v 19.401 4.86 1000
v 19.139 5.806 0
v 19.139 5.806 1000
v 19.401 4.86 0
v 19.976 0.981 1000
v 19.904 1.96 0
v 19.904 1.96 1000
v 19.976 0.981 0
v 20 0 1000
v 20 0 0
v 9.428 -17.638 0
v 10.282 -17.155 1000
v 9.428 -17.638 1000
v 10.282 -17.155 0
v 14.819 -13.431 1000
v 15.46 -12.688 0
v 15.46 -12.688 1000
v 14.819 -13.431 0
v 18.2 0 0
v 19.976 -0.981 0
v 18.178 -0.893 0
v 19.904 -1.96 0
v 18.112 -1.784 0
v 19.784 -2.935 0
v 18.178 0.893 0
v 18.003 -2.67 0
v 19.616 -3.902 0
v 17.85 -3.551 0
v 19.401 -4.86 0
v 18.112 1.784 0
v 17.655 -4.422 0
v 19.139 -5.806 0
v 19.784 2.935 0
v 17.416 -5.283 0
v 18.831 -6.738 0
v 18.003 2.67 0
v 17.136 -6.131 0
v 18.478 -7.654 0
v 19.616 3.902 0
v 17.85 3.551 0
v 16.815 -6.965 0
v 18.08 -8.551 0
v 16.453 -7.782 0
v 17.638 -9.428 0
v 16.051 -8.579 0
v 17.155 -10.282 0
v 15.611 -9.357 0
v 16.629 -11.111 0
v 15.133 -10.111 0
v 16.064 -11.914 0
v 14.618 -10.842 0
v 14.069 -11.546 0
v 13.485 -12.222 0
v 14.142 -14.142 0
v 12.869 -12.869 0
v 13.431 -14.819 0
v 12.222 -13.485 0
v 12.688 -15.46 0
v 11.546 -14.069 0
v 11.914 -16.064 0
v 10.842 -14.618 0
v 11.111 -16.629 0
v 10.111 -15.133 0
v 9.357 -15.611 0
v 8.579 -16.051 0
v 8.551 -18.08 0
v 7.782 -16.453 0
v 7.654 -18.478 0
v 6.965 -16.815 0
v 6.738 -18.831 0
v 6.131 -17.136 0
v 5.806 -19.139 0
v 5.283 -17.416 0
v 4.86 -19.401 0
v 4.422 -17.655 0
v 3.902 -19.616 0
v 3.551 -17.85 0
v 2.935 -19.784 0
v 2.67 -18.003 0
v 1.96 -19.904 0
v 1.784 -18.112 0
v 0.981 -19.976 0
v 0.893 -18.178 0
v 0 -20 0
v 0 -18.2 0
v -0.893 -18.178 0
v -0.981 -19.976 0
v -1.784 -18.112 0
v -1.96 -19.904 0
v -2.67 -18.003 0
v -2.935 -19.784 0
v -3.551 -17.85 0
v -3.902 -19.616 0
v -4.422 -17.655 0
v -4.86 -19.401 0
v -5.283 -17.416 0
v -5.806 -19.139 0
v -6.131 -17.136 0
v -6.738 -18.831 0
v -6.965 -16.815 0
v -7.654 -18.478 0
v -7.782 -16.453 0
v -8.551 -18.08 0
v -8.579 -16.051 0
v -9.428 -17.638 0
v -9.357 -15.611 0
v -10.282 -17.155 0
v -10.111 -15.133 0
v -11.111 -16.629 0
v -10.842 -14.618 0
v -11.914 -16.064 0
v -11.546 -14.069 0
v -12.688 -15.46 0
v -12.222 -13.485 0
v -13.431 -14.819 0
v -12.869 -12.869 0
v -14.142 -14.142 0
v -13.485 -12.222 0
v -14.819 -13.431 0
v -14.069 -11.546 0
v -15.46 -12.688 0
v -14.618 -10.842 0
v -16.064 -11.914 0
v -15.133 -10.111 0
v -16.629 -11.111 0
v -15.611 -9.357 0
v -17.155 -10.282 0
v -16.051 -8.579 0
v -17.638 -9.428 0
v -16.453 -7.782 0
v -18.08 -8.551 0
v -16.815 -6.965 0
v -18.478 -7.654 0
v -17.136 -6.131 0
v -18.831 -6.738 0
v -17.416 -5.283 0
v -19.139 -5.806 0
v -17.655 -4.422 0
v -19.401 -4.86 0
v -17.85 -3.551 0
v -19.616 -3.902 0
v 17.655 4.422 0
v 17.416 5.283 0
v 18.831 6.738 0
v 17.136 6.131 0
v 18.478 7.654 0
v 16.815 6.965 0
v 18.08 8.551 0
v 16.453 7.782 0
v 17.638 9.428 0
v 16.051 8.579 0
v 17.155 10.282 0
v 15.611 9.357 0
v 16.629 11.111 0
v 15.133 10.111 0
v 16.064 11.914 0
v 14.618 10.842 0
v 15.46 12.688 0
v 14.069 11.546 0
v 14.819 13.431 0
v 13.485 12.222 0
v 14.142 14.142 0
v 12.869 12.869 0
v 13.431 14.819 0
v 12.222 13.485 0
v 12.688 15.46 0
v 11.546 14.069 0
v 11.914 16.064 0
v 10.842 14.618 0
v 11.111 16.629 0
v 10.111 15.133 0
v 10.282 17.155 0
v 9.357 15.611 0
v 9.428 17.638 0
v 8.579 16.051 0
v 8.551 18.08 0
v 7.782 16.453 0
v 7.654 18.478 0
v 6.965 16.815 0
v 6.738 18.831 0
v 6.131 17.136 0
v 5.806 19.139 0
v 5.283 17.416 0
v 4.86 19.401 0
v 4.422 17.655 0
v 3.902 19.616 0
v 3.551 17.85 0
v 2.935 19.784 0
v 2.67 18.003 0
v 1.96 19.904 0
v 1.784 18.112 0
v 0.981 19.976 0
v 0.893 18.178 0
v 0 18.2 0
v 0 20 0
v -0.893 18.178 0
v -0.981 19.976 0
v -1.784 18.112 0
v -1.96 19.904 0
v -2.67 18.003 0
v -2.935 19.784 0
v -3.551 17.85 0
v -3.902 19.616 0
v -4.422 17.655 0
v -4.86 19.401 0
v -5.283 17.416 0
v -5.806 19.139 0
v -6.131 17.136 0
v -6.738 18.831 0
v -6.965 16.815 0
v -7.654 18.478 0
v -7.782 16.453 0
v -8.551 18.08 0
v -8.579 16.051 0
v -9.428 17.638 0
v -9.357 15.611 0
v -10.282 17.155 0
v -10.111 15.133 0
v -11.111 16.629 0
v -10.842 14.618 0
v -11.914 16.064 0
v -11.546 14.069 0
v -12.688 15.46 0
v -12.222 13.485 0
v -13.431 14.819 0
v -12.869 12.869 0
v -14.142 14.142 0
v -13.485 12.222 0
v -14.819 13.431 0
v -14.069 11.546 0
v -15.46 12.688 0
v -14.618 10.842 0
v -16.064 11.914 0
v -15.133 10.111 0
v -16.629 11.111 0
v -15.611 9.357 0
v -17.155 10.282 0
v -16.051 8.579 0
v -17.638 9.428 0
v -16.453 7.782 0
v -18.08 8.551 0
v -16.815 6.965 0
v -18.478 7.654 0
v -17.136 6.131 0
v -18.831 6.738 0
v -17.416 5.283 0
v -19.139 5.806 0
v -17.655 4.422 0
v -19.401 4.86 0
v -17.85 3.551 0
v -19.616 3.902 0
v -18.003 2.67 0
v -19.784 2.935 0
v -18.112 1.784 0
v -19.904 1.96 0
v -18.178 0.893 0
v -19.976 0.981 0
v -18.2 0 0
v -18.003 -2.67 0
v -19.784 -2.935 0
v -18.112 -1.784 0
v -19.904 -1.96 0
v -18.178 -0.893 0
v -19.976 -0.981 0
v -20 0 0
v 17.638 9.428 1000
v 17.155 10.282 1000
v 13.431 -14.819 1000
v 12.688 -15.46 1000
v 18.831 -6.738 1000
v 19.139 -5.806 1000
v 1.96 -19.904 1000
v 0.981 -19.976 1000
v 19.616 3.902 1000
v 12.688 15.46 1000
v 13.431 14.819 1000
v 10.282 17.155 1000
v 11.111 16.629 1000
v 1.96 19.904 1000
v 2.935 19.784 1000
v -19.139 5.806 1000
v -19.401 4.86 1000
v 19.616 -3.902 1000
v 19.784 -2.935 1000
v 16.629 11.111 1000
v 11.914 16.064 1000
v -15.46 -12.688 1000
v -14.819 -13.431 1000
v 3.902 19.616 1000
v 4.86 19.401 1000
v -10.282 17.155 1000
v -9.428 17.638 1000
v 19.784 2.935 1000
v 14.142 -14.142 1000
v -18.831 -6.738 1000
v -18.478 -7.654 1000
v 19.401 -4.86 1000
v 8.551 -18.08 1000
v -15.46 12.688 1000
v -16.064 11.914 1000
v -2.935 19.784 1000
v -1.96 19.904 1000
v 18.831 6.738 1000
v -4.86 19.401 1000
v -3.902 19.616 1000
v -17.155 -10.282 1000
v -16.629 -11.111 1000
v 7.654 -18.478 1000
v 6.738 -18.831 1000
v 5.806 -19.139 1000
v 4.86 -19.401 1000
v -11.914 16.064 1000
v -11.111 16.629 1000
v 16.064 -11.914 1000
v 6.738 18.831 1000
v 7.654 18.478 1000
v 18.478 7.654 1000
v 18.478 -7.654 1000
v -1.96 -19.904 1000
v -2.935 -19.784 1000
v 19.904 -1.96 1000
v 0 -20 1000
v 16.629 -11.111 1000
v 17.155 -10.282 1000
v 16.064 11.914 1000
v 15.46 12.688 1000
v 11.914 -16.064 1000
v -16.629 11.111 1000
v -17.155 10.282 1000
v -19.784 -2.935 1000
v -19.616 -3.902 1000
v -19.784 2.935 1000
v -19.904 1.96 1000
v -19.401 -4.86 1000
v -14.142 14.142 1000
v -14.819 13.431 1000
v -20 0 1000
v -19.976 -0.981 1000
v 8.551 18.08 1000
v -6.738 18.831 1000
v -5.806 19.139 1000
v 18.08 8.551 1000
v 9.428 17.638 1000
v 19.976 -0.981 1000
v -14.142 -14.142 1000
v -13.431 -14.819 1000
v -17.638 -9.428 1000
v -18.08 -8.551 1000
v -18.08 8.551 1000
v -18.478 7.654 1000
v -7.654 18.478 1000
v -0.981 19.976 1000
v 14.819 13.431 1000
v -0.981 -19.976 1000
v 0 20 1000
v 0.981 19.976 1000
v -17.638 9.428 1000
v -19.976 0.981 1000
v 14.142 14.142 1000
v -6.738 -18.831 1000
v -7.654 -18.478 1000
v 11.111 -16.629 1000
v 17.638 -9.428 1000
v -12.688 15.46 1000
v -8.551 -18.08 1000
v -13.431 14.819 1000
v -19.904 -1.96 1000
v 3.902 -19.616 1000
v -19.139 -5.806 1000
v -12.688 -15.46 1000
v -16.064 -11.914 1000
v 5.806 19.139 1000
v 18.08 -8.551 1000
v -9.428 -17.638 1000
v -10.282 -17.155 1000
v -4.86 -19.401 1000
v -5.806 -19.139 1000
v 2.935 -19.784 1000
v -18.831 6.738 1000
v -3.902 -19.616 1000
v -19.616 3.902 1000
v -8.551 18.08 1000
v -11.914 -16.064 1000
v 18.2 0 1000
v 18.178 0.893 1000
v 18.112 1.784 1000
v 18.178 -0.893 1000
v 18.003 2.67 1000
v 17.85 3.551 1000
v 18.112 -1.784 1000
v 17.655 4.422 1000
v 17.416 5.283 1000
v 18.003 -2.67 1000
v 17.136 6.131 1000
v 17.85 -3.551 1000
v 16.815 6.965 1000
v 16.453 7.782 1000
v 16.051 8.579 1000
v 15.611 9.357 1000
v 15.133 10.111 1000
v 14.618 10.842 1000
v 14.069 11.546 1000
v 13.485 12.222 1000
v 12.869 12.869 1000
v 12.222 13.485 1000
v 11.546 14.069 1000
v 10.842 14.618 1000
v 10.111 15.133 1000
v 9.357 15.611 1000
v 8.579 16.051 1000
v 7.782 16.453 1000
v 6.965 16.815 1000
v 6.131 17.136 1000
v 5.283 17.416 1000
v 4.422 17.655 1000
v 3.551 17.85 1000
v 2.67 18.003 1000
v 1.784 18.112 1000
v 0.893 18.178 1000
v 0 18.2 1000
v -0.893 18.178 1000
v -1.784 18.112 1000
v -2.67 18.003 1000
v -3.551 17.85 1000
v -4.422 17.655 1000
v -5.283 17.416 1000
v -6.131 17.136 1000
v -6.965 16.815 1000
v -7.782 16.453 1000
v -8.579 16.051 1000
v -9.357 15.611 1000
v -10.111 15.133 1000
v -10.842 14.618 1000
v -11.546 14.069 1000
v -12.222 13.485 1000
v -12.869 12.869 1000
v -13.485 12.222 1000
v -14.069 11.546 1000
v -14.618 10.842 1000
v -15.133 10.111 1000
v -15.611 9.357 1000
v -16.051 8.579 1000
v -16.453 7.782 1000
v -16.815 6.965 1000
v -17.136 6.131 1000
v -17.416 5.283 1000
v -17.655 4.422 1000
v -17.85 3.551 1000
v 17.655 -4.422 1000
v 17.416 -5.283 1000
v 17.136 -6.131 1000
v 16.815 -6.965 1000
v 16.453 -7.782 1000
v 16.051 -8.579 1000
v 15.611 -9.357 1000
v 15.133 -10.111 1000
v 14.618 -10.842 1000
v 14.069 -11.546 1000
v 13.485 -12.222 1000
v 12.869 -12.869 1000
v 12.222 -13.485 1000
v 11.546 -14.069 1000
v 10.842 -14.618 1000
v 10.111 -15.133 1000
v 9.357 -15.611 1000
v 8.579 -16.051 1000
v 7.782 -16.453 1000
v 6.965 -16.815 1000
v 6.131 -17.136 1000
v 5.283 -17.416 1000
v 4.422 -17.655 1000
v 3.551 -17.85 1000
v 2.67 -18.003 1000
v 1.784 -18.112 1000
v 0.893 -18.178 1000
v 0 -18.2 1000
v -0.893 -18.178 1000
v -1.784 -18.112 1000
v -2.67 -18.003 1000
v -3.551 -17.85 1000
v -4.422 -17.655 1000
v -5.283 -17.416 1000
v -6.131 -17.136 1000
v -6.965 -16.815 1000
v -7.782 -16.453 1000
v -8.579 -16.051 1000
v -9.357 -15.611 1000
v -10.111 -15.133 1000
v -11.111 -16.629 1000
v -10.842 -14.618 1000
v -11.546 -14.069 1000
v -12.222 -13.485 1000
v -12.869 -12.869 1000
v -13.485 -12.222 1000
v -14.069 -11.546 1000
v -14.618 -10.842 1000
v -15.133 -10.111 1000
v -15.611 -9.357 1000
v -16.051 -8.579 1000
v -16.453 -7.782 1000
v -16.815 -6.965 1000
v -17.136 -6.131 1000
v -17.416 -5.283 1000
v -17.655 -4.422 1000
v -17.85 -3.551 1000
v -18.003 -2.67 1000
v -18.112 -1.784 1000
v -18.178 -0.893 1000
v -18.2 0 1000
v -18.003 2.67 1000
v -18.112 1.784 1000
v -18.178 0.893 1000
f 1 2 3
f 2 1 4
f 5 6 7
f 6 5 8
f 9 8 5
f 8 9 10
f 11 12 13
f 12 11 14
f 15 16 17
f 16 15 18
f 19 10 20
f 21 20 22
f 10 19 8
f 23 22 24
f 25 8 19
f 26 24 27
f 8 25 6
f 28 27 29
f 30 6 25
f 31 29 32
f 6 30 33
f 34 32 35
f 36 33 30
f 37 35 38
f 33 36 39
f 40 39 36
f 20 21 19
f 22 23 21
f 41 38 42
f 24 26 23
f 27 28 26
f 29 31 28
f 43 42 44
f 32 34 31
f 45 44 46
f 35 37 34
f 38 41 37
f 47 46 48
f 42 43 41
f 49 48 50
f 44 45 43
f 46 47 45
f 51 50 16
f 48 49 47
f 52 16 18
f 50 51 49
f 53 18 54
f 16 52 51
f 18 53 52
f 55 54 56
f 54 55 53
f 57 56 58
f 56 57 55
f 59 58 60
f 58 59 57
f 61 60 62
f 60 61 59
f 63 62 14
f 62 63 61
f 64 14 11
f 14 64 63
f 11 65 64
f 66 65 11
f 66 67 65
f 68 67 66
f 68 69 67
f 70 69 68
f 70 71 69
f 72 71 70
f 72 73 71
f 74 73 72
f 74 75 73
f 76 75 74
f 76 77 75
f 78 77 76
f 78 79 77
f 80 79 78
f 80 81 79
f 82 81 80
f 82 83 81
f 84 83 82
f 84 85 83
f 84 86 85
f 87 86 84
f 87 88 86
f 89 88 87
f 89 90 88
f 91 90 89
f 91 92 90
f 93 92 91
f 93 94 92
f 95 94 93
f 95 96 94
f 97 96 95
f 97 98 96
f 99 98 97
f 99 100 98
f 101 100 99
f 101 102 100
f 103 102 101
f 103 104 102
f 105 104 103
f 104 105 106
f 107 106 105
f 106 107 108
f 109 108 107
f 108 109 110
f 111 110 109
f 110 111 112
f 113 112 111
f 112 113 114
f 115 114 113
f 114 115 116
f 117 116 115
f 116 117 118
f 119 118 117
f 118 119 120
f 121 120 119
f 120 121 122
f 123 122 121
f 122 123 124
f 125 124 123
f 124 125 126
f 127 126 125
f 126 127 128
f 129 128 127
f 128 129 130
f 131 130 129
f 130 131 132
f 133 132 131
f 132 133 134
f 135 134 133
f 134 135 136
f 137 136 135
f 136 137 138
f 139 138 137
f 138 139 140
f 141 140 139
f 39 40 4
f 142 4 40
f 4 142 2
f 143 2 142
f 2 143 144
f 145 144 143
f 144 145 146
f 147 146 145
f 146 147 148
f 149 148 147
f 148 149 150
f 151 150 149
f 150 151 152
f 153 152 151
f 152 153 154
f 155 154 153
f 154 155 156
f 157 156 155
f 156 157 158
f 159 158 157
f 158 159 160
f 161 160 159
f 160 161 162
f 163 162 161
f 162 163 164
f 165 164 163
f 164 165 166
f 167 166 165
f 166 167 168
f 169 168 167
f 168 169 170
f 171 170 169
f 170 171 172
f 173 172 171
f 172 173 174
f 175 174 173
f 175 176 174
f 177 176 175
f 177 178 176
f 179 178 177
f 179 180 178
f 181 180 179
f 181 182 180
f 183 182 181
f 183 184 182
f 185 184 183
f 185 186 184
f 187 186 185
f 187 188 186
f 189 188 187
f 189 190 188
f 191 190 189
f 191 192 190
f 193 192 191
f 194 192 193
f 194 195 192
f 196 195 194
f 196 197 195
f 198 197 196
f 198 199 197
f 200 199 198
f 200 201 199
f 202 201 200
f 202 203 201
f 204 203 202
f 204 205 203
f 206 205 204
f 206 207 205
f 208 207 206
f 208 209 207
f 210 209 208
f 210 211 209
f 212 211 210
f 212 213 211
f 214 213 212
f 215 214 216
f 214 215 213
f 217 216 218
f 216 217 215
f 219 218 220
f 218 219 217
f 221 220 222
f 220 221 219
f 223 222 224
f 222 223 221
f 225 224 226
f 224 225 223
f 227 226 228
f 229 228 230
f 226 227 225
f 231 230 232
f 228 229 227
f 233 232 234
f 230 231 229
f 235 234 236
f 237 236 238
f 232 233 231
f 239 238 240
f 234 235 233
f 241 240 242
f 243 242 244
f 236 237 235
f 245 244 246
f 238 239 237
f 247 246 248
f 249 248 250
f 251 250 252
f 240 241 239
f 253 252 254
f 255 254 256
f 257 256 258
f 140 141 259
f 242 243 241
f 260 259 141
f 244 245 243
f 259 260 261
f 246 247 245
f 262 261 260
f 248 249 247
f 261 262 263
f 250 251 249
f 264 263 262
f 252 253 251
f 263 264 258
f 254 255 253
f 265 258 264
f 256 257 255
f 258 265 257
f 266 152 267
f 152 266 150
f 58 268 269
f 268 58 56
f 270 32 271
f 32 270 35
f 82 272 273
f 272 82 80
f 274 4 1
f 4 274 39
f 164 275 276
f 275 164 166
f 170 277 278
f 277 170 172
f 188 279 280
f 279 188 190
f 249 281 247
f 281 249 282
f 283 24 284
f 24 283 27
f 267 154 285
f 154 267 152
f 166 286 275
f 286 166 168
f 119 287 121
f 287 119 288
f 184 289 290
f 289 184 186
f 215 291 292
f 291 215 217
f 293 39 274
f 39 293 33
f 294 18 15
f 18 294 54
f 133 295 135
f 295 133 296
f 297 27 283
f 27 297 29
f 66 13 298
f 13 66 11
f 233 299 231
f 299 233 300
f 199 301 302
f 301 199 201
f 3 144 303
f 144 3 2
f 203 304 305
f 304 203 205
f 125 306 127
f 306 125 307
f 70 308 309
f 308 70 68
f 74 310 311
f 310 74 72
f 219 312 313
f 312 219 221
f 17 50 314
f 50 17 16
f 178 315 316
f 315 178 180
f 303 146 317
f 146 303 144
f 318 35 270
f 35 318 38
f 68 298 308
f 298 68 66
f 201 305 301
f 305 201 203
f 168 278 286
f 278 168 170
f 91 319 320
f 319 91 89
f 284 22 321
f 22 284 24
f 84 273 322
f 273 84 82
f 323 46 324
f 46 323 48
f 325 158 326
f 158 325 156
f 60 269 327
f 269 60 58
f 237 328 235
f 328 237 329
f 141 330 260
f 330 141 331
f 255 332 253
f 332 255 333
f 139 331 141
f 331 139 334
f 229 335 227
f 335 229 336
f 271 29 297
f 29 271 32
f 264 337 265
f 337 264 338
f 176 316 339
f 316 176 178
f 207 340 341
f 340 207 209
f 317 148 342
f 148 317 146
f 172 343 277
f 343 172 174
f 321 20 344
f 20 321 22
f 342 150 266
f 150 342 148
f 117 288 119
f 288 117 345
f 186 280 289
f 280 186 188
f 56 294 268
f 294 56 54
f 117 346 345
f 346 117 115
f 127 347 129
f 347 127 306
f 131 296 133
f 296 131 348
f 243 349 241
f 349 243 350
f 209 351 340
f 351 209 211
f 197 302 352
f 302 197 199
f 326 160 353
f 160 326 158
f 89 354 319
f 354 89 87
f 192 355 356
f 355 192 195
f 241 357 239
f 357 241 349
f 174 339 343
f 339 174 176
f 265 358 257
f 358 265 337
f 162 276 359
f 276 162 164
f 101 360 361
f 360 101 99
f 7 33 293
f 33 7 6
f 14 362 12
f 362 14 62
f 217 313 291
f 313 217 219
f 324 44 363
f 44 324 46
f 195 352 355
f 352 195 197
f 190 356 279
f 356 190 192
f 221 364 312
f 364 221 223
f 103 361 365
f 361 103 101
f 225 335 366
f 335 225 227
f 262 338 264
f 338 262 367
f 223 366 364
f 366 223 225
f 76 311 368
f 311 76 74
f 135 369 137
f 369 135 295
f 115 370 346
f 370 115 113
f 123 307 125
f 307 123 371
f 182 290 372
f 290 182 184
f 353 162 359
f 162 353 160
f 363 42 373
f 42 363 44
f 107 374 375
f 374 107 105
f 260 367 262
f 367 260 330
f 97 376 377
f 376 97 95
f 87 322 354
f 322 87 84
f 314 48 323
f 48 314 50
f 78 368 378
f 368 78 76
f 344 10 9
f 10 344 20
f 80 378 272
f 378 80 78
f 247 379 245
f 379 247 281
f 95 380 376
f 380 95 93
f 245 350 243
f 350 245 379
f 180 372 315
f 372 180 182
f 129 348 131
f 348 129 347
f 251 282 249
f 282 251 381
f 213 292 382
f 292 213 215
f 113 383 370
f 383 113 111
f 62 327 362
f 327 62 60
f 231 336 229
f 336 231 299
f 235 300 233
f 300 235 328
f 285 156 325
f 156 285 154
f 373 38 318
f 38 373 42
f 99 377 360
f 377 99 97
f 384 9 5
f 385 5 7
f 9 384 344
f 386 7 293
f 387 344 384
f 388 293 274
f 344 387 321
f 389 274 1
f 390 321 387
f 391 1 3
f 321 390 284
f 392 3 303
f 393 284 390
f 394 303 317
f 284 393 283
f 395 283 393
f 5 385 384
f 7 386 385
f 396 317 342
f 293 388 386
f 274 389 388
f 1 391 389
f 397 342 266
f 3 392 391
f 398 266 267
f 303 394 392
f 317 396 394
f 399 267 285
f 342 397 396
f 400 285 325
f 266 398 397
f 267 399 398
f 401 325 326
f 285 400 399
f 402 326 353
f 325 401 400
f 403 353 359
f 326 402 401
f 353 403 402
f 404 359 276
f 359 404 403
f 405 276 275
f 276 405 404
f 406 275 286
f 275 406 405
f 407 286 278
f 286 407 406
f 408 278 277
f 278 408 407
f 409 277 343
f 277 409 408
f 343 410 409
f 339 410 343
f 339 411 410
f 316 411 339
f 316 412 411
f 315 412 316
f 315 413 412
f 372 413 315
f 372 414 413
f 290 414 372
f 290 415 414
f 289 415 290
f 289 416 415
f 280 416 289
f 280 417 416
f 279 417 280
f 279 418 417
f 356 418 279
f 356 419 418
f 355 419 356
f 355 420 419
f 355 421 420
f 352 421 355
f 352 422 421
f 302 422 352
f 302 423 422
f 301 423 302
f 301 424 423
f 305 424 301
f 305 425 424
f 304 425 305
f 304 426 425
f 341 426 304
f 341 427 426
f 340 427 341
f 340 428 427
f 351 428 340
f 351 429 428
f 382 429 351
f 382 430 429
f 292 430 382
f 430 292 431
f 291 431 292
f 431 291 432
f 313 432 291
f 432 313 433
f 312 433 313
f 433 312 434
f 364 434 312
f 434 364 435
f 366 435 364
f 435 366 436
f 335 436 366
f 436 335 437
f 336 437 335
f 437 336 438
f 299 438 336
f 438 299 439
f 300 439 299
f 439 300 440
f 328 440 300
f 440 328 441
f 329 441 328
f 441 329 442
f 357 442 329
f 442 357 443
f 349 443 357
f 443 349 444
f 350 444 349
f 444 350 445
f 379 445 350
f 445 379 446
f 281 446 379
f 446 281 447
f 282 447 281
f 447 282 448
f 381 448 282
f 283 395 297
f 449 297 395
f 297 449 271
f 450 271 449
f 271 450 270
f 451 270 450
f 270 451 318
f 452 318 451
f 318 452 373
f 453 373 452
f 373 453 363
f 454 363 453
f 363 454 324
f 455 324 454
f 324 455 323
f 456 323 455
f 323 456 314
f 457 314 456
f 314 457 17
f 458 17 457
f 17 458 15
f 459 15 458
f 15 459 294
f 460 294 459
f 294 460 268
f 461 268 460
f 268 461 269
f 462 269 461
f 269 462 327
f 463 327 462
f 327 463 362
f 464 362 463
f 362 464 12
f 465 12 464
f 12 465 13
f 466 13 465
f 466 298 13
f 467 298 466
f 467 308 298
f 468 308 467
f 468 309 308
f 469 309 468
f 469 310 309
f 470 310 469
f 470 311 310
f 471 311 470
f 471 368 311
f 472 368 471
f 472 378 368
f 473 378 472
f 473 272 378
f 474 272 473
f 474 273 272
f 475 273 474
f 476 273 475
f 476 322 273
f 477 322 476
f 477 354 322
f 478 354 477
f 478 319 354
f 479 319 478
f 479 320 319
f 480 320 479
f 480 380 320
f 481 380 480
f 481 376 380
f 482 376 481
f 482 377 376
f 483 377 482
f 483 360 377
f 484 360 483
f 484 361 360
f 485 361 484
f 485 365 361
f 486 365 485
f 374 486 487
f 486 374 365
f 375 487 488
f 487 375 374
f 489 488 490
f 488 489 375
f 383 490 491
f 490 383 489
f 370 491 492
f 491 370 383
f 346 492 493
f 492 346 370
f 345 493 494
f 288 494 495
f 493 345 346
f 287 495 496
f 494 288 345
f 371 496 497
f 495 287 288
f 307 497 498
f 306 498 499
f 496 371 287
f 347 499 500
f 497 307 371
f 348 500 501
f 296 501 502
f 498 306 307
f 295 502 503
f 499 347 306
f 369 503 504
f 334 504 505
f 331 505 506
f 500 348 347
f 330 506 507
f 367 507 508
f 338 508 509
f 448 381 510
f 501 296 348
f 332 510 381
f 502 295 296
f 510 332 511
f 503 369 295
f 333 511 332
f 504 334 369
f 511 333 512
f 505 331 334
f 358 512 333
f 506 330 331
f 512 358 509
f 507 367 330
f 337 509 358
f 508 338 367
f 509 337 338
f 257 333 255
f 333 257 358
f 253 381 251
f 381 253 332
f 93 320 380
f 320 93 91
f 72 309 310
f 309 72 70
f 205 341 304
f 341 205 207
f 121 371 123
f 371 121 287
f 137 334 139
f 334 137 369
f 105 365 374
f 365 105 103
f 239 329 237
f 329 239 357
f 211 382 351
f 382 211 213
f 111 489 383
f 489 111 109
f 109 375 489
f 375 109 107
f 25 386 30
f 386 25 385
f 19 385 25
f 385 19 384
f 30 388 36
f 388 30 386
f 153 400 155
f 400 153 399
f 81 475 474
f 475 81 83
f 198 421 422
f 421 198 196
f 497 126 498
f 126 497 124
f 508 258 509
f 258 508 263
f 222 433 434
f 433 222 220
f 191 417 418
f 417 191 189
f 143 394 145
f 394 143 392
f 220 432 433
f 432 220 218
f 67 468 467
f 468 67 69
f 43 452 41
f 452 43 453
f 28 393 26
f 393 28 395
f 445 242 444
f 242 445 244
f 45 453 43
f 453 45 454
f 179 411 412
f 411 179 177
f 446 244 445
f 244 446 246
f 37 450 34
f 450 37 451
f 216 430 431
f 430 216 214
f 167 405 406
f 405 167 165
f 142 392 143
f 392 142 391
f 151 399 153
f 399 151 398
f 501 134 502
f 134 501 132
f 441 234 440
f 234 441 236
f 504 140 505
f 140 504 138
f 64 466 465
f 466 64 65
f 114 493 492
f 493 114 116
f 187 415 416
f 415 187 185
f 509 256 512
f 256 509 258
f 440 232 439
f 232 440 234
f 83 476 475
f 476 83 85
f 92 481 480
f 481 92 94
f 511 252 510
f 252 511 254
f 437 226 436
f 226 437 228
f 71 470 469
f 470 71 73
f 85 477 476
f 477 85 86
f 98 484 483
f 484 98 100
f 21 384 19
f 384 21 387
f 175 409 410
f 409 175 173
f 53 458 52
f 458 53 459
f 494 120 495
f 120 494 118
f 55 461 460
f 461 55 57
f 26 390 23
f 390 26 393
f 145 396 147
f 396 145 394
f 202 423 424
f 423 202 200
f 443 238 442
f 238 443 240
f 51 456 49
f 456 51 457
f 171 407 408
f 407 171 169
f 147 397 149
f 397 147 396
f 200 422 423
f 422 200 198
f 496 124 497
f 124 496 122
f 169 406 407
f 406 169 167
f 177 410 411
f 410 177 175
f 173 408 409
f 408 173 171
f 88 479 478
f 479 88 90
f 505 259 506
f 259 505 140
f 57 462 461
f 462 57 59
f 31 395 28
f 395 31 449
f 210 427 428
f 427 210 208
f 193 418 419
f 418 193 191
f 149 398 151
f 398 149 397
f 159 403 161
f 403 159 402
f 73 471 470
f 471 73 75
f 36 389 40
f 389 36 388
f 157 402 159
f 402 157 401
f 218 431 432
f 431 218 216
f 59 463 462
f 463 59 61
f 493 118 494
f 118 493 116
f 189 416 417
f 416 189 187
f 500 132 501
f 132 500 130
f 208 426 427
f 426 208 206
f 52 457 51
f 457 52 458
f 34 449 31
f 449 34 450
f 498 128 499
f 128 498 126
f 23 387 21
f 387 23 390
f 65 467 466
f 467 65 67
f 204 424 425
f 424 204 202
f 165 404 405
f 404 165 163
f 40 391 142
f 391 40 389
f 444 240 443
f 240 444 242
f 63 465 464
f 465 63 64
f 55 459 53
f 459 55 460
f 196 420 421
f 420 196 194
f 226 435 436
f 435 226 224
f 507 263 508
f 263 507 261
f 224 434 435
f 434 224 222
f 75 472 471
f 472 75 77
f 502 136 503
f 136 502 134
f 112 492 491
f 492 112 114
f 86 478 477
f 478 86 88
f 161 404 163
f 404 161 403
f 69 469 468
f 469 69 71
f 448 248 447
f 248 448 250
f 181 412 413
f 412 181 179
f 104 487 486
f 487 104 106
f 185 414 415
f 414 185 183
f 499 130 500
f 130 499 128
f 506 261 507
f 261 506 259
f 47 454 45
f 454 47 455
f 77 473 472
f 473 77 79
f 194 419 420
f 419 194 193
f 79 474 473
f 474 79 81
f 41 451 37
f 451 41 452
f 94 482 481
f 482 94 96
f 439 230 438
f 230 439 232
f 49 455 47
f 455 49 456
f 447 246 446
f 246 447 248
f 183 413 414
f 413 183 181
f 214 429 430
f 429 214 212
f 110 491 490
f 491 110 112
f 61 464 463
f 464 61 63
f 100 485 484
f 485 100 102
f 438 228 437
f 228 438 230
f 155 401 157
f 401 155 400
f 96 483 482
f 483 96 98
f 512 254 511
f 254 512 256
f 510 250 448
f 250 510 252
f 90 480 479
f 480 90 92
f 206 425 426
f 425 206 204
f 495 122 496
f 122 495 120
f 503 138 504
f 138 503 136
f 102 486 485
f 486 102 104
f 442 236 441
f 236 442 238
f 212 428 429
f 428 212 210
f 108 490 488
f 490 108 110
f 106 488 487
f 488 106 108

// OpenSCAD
$fn = 128;

// HT 40 pipe (approx.): DN40, OD 40 mm, wall ~1.8 mm, length 1000 mm
length = 1000;
od = 40;
wall = 1.8;
id = od - 2*wall;

difference() {
    cylinder(h = length, d = od, center = false);
    translate([0,0,-0.1])
        cylinder(h = length + 0.2, d = id, center = false);
}
